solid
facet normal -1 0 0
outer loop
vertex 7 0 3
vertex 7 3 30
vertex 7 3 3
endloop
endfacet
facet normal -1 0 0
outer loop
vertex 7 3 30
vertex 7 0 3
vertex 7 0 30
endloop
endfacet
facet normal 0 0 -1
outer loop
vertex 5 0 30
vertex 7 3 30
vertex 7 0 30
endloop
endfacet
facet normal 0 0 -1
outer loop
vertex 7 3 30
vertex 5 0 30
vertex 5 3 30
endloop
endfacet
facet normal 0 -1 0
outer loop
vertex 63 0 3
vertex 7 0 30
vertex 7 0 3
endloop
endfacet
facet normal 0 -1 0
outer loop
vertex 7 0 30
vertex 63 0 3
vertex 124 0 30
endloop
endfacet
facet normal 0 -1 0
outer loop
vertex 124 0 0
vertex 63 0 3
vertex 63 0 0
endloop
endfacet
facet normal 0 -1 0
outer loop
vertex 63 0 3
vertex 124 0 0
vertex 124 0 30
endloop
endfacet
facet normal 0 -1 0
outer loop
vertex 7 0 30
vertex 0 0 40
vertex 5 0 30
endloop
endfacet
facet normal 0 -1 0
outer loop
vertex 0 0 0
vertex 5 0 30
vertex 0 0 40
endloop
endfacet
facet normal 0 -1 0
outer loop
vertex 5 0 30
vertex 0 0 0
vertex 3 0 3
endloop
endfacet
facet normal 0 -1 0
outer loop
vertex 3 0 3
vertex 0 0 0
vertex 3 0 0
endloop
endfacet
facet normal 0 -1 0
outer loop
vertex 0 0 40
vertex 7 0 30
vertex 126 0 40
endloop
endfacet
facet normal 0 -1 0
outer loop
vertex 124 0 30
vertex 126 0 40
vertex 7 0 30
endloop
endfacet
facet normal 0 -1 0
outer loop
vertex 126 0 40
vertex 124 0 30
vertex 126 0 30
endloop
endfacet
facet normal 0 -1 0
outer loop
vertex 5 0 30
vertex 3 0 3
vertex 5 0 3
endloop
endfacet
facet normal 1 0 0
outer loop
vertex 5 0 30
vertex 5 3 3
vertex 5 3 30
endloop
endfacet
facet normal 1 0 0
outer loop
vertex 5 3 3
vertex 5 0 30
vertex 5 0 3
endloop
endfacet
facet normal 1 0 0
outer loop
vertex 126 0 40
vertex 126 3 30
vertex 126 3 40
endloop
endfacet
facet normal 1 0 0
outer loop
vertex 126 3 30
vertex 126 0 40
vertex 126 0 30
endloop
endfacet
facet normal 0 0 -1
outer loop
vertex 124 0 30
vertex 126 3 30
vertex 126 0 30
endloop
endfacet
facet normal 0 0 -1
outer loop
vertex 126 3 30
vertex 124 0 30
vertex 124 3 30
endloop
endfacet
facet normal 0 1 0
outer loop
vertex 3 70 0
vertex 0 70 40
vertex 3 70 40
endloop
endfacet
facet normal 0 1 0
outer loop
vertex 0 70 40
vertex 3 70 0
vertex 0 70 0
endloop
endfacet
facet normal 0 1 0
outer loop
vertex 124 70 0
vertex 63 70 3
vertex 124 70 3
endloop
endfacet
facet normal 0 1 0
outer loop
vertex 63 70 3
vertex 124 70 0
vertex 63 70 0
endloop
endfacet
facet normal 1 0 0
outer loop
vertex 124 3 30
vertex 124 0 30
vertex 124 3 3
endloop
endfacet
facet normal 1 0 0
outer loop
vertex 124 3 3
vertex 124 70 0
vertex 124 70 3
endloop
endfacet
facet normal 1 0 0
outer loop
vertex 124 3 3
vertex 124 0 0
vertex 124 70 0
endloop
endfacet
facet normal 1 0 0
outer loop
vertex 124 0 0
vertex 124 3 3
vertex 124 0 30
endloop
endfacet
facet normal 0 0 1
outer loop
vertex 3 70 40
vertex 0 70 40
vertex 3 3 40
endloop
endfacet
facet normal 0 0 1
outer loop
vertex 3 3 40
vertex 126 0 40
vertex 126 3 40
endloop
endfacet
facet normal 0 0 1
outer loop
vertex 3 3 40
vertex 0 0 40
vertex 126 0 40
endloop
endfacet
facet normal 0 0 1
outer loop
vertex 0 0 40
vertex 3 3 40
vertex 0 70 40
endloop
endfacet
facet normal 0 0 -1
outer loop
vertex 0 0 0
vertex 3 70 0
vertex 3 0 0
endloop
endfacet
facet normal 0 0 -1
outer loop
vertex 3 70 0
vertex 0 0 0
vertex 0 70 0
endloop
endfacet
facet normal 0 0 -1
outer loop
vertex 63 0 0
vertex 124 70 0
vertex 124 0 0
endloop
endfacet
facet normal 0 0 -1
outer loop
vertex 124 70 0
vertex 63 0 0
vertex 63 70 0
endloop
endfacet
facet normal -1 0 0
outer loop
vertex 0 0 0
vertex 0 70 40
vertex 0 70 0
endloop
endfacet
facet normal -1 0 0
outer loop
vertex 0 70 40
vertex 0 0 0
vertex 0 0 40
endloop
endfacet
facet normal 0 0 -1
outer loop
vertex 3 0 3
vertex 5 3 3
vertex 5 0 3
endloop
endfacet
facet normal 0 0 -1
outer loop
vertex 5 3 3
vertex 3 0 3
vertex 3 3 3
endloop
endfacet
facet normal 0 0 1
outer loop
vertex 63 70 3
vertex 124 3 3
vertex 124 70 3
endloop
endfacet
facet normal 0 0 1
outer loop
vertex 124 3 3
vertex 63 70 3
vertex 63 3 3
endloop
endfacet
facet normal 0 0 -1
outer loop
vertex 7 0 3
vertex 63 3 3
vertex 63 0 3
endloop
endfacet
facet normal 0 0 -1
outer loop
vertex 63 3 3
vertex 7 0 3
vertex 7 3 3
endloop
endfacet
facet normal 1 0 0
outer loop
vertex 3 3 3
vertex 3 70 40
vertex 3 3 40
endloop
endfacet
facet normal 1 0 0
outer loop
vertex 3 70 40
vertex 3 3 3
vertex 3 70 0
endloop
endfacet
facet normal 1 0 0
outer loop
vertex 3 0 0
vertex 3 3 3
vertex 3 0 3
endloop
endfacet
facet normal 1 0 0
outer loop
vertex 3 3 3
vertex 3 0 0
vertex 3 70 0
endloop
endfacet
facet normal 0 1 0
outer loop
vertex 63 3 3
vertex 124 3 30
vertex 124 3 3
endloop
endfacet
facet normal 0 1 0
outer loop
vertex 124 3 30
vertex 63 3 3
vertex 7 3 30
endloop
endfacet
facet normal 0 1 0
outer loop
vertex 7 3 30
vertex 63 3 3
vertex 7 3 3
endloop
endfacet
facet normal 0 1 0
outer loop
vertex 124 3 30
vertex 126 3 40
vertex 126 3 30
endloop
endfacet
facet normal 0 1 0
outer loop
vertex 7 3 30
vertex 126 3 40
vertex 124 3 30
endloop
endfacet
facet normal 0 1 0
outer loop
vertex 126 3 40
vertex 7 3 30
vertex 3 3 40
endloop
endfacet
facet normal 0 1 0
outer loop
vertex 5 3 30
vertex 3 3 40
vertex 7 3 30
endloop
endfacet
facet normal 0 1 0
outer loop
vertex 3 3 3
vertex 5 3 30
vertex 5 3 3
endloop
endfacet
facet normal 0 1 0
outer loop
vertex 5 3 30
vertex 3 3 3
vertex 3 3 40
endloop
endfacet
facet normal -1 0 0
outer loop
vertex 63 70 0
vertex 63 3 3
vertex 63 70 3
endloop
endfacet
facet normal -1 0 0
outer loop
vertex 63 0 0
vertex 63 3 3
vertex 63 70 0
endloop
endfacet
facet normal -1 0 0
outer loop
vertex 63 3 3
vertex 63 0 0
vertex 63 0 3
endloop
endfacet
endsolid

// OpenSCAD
// Open-top rectangular buffer tank for a mini horizontal gel-electrophoresis box. NOVEL general part.
//

inner_l = 120;
inner_w = 70;
height  = 40;
wall    = 3;
floor   = 3;

$fn = 48;

inner_h = height - floor;

difference() {
    cube([inner_l + 2 * wall, inner_w, height]);
    translate([wall, wall, floor]) cube([inner_l, inner_w, height - floor]);     // empty space below the platform
    translate([wall, wall, height - inner_h]) cube([inner_l + 2 * wall, inner_w, inner_h]);   // walls above the empty space
    // solid platform the gel tray rests on, centred in X, spanning the full width
    translate([wall, 0, height - inner_h - 10]) cube([60, inner_w, 10]);
    // electrode holes: a 2 mm hole through each end wall, horizontal along X, at y = 0, z = 30
    for (x = [wall, inner_l + wall - 1])
        translate([x, 0, height - inner_h - 10]) difference() {
            cube([wall + 1, inner_w, height - floor]);
            translate([0, 0, -1]) cube([2, inner_w, height - floor + 1]);
        }
}
